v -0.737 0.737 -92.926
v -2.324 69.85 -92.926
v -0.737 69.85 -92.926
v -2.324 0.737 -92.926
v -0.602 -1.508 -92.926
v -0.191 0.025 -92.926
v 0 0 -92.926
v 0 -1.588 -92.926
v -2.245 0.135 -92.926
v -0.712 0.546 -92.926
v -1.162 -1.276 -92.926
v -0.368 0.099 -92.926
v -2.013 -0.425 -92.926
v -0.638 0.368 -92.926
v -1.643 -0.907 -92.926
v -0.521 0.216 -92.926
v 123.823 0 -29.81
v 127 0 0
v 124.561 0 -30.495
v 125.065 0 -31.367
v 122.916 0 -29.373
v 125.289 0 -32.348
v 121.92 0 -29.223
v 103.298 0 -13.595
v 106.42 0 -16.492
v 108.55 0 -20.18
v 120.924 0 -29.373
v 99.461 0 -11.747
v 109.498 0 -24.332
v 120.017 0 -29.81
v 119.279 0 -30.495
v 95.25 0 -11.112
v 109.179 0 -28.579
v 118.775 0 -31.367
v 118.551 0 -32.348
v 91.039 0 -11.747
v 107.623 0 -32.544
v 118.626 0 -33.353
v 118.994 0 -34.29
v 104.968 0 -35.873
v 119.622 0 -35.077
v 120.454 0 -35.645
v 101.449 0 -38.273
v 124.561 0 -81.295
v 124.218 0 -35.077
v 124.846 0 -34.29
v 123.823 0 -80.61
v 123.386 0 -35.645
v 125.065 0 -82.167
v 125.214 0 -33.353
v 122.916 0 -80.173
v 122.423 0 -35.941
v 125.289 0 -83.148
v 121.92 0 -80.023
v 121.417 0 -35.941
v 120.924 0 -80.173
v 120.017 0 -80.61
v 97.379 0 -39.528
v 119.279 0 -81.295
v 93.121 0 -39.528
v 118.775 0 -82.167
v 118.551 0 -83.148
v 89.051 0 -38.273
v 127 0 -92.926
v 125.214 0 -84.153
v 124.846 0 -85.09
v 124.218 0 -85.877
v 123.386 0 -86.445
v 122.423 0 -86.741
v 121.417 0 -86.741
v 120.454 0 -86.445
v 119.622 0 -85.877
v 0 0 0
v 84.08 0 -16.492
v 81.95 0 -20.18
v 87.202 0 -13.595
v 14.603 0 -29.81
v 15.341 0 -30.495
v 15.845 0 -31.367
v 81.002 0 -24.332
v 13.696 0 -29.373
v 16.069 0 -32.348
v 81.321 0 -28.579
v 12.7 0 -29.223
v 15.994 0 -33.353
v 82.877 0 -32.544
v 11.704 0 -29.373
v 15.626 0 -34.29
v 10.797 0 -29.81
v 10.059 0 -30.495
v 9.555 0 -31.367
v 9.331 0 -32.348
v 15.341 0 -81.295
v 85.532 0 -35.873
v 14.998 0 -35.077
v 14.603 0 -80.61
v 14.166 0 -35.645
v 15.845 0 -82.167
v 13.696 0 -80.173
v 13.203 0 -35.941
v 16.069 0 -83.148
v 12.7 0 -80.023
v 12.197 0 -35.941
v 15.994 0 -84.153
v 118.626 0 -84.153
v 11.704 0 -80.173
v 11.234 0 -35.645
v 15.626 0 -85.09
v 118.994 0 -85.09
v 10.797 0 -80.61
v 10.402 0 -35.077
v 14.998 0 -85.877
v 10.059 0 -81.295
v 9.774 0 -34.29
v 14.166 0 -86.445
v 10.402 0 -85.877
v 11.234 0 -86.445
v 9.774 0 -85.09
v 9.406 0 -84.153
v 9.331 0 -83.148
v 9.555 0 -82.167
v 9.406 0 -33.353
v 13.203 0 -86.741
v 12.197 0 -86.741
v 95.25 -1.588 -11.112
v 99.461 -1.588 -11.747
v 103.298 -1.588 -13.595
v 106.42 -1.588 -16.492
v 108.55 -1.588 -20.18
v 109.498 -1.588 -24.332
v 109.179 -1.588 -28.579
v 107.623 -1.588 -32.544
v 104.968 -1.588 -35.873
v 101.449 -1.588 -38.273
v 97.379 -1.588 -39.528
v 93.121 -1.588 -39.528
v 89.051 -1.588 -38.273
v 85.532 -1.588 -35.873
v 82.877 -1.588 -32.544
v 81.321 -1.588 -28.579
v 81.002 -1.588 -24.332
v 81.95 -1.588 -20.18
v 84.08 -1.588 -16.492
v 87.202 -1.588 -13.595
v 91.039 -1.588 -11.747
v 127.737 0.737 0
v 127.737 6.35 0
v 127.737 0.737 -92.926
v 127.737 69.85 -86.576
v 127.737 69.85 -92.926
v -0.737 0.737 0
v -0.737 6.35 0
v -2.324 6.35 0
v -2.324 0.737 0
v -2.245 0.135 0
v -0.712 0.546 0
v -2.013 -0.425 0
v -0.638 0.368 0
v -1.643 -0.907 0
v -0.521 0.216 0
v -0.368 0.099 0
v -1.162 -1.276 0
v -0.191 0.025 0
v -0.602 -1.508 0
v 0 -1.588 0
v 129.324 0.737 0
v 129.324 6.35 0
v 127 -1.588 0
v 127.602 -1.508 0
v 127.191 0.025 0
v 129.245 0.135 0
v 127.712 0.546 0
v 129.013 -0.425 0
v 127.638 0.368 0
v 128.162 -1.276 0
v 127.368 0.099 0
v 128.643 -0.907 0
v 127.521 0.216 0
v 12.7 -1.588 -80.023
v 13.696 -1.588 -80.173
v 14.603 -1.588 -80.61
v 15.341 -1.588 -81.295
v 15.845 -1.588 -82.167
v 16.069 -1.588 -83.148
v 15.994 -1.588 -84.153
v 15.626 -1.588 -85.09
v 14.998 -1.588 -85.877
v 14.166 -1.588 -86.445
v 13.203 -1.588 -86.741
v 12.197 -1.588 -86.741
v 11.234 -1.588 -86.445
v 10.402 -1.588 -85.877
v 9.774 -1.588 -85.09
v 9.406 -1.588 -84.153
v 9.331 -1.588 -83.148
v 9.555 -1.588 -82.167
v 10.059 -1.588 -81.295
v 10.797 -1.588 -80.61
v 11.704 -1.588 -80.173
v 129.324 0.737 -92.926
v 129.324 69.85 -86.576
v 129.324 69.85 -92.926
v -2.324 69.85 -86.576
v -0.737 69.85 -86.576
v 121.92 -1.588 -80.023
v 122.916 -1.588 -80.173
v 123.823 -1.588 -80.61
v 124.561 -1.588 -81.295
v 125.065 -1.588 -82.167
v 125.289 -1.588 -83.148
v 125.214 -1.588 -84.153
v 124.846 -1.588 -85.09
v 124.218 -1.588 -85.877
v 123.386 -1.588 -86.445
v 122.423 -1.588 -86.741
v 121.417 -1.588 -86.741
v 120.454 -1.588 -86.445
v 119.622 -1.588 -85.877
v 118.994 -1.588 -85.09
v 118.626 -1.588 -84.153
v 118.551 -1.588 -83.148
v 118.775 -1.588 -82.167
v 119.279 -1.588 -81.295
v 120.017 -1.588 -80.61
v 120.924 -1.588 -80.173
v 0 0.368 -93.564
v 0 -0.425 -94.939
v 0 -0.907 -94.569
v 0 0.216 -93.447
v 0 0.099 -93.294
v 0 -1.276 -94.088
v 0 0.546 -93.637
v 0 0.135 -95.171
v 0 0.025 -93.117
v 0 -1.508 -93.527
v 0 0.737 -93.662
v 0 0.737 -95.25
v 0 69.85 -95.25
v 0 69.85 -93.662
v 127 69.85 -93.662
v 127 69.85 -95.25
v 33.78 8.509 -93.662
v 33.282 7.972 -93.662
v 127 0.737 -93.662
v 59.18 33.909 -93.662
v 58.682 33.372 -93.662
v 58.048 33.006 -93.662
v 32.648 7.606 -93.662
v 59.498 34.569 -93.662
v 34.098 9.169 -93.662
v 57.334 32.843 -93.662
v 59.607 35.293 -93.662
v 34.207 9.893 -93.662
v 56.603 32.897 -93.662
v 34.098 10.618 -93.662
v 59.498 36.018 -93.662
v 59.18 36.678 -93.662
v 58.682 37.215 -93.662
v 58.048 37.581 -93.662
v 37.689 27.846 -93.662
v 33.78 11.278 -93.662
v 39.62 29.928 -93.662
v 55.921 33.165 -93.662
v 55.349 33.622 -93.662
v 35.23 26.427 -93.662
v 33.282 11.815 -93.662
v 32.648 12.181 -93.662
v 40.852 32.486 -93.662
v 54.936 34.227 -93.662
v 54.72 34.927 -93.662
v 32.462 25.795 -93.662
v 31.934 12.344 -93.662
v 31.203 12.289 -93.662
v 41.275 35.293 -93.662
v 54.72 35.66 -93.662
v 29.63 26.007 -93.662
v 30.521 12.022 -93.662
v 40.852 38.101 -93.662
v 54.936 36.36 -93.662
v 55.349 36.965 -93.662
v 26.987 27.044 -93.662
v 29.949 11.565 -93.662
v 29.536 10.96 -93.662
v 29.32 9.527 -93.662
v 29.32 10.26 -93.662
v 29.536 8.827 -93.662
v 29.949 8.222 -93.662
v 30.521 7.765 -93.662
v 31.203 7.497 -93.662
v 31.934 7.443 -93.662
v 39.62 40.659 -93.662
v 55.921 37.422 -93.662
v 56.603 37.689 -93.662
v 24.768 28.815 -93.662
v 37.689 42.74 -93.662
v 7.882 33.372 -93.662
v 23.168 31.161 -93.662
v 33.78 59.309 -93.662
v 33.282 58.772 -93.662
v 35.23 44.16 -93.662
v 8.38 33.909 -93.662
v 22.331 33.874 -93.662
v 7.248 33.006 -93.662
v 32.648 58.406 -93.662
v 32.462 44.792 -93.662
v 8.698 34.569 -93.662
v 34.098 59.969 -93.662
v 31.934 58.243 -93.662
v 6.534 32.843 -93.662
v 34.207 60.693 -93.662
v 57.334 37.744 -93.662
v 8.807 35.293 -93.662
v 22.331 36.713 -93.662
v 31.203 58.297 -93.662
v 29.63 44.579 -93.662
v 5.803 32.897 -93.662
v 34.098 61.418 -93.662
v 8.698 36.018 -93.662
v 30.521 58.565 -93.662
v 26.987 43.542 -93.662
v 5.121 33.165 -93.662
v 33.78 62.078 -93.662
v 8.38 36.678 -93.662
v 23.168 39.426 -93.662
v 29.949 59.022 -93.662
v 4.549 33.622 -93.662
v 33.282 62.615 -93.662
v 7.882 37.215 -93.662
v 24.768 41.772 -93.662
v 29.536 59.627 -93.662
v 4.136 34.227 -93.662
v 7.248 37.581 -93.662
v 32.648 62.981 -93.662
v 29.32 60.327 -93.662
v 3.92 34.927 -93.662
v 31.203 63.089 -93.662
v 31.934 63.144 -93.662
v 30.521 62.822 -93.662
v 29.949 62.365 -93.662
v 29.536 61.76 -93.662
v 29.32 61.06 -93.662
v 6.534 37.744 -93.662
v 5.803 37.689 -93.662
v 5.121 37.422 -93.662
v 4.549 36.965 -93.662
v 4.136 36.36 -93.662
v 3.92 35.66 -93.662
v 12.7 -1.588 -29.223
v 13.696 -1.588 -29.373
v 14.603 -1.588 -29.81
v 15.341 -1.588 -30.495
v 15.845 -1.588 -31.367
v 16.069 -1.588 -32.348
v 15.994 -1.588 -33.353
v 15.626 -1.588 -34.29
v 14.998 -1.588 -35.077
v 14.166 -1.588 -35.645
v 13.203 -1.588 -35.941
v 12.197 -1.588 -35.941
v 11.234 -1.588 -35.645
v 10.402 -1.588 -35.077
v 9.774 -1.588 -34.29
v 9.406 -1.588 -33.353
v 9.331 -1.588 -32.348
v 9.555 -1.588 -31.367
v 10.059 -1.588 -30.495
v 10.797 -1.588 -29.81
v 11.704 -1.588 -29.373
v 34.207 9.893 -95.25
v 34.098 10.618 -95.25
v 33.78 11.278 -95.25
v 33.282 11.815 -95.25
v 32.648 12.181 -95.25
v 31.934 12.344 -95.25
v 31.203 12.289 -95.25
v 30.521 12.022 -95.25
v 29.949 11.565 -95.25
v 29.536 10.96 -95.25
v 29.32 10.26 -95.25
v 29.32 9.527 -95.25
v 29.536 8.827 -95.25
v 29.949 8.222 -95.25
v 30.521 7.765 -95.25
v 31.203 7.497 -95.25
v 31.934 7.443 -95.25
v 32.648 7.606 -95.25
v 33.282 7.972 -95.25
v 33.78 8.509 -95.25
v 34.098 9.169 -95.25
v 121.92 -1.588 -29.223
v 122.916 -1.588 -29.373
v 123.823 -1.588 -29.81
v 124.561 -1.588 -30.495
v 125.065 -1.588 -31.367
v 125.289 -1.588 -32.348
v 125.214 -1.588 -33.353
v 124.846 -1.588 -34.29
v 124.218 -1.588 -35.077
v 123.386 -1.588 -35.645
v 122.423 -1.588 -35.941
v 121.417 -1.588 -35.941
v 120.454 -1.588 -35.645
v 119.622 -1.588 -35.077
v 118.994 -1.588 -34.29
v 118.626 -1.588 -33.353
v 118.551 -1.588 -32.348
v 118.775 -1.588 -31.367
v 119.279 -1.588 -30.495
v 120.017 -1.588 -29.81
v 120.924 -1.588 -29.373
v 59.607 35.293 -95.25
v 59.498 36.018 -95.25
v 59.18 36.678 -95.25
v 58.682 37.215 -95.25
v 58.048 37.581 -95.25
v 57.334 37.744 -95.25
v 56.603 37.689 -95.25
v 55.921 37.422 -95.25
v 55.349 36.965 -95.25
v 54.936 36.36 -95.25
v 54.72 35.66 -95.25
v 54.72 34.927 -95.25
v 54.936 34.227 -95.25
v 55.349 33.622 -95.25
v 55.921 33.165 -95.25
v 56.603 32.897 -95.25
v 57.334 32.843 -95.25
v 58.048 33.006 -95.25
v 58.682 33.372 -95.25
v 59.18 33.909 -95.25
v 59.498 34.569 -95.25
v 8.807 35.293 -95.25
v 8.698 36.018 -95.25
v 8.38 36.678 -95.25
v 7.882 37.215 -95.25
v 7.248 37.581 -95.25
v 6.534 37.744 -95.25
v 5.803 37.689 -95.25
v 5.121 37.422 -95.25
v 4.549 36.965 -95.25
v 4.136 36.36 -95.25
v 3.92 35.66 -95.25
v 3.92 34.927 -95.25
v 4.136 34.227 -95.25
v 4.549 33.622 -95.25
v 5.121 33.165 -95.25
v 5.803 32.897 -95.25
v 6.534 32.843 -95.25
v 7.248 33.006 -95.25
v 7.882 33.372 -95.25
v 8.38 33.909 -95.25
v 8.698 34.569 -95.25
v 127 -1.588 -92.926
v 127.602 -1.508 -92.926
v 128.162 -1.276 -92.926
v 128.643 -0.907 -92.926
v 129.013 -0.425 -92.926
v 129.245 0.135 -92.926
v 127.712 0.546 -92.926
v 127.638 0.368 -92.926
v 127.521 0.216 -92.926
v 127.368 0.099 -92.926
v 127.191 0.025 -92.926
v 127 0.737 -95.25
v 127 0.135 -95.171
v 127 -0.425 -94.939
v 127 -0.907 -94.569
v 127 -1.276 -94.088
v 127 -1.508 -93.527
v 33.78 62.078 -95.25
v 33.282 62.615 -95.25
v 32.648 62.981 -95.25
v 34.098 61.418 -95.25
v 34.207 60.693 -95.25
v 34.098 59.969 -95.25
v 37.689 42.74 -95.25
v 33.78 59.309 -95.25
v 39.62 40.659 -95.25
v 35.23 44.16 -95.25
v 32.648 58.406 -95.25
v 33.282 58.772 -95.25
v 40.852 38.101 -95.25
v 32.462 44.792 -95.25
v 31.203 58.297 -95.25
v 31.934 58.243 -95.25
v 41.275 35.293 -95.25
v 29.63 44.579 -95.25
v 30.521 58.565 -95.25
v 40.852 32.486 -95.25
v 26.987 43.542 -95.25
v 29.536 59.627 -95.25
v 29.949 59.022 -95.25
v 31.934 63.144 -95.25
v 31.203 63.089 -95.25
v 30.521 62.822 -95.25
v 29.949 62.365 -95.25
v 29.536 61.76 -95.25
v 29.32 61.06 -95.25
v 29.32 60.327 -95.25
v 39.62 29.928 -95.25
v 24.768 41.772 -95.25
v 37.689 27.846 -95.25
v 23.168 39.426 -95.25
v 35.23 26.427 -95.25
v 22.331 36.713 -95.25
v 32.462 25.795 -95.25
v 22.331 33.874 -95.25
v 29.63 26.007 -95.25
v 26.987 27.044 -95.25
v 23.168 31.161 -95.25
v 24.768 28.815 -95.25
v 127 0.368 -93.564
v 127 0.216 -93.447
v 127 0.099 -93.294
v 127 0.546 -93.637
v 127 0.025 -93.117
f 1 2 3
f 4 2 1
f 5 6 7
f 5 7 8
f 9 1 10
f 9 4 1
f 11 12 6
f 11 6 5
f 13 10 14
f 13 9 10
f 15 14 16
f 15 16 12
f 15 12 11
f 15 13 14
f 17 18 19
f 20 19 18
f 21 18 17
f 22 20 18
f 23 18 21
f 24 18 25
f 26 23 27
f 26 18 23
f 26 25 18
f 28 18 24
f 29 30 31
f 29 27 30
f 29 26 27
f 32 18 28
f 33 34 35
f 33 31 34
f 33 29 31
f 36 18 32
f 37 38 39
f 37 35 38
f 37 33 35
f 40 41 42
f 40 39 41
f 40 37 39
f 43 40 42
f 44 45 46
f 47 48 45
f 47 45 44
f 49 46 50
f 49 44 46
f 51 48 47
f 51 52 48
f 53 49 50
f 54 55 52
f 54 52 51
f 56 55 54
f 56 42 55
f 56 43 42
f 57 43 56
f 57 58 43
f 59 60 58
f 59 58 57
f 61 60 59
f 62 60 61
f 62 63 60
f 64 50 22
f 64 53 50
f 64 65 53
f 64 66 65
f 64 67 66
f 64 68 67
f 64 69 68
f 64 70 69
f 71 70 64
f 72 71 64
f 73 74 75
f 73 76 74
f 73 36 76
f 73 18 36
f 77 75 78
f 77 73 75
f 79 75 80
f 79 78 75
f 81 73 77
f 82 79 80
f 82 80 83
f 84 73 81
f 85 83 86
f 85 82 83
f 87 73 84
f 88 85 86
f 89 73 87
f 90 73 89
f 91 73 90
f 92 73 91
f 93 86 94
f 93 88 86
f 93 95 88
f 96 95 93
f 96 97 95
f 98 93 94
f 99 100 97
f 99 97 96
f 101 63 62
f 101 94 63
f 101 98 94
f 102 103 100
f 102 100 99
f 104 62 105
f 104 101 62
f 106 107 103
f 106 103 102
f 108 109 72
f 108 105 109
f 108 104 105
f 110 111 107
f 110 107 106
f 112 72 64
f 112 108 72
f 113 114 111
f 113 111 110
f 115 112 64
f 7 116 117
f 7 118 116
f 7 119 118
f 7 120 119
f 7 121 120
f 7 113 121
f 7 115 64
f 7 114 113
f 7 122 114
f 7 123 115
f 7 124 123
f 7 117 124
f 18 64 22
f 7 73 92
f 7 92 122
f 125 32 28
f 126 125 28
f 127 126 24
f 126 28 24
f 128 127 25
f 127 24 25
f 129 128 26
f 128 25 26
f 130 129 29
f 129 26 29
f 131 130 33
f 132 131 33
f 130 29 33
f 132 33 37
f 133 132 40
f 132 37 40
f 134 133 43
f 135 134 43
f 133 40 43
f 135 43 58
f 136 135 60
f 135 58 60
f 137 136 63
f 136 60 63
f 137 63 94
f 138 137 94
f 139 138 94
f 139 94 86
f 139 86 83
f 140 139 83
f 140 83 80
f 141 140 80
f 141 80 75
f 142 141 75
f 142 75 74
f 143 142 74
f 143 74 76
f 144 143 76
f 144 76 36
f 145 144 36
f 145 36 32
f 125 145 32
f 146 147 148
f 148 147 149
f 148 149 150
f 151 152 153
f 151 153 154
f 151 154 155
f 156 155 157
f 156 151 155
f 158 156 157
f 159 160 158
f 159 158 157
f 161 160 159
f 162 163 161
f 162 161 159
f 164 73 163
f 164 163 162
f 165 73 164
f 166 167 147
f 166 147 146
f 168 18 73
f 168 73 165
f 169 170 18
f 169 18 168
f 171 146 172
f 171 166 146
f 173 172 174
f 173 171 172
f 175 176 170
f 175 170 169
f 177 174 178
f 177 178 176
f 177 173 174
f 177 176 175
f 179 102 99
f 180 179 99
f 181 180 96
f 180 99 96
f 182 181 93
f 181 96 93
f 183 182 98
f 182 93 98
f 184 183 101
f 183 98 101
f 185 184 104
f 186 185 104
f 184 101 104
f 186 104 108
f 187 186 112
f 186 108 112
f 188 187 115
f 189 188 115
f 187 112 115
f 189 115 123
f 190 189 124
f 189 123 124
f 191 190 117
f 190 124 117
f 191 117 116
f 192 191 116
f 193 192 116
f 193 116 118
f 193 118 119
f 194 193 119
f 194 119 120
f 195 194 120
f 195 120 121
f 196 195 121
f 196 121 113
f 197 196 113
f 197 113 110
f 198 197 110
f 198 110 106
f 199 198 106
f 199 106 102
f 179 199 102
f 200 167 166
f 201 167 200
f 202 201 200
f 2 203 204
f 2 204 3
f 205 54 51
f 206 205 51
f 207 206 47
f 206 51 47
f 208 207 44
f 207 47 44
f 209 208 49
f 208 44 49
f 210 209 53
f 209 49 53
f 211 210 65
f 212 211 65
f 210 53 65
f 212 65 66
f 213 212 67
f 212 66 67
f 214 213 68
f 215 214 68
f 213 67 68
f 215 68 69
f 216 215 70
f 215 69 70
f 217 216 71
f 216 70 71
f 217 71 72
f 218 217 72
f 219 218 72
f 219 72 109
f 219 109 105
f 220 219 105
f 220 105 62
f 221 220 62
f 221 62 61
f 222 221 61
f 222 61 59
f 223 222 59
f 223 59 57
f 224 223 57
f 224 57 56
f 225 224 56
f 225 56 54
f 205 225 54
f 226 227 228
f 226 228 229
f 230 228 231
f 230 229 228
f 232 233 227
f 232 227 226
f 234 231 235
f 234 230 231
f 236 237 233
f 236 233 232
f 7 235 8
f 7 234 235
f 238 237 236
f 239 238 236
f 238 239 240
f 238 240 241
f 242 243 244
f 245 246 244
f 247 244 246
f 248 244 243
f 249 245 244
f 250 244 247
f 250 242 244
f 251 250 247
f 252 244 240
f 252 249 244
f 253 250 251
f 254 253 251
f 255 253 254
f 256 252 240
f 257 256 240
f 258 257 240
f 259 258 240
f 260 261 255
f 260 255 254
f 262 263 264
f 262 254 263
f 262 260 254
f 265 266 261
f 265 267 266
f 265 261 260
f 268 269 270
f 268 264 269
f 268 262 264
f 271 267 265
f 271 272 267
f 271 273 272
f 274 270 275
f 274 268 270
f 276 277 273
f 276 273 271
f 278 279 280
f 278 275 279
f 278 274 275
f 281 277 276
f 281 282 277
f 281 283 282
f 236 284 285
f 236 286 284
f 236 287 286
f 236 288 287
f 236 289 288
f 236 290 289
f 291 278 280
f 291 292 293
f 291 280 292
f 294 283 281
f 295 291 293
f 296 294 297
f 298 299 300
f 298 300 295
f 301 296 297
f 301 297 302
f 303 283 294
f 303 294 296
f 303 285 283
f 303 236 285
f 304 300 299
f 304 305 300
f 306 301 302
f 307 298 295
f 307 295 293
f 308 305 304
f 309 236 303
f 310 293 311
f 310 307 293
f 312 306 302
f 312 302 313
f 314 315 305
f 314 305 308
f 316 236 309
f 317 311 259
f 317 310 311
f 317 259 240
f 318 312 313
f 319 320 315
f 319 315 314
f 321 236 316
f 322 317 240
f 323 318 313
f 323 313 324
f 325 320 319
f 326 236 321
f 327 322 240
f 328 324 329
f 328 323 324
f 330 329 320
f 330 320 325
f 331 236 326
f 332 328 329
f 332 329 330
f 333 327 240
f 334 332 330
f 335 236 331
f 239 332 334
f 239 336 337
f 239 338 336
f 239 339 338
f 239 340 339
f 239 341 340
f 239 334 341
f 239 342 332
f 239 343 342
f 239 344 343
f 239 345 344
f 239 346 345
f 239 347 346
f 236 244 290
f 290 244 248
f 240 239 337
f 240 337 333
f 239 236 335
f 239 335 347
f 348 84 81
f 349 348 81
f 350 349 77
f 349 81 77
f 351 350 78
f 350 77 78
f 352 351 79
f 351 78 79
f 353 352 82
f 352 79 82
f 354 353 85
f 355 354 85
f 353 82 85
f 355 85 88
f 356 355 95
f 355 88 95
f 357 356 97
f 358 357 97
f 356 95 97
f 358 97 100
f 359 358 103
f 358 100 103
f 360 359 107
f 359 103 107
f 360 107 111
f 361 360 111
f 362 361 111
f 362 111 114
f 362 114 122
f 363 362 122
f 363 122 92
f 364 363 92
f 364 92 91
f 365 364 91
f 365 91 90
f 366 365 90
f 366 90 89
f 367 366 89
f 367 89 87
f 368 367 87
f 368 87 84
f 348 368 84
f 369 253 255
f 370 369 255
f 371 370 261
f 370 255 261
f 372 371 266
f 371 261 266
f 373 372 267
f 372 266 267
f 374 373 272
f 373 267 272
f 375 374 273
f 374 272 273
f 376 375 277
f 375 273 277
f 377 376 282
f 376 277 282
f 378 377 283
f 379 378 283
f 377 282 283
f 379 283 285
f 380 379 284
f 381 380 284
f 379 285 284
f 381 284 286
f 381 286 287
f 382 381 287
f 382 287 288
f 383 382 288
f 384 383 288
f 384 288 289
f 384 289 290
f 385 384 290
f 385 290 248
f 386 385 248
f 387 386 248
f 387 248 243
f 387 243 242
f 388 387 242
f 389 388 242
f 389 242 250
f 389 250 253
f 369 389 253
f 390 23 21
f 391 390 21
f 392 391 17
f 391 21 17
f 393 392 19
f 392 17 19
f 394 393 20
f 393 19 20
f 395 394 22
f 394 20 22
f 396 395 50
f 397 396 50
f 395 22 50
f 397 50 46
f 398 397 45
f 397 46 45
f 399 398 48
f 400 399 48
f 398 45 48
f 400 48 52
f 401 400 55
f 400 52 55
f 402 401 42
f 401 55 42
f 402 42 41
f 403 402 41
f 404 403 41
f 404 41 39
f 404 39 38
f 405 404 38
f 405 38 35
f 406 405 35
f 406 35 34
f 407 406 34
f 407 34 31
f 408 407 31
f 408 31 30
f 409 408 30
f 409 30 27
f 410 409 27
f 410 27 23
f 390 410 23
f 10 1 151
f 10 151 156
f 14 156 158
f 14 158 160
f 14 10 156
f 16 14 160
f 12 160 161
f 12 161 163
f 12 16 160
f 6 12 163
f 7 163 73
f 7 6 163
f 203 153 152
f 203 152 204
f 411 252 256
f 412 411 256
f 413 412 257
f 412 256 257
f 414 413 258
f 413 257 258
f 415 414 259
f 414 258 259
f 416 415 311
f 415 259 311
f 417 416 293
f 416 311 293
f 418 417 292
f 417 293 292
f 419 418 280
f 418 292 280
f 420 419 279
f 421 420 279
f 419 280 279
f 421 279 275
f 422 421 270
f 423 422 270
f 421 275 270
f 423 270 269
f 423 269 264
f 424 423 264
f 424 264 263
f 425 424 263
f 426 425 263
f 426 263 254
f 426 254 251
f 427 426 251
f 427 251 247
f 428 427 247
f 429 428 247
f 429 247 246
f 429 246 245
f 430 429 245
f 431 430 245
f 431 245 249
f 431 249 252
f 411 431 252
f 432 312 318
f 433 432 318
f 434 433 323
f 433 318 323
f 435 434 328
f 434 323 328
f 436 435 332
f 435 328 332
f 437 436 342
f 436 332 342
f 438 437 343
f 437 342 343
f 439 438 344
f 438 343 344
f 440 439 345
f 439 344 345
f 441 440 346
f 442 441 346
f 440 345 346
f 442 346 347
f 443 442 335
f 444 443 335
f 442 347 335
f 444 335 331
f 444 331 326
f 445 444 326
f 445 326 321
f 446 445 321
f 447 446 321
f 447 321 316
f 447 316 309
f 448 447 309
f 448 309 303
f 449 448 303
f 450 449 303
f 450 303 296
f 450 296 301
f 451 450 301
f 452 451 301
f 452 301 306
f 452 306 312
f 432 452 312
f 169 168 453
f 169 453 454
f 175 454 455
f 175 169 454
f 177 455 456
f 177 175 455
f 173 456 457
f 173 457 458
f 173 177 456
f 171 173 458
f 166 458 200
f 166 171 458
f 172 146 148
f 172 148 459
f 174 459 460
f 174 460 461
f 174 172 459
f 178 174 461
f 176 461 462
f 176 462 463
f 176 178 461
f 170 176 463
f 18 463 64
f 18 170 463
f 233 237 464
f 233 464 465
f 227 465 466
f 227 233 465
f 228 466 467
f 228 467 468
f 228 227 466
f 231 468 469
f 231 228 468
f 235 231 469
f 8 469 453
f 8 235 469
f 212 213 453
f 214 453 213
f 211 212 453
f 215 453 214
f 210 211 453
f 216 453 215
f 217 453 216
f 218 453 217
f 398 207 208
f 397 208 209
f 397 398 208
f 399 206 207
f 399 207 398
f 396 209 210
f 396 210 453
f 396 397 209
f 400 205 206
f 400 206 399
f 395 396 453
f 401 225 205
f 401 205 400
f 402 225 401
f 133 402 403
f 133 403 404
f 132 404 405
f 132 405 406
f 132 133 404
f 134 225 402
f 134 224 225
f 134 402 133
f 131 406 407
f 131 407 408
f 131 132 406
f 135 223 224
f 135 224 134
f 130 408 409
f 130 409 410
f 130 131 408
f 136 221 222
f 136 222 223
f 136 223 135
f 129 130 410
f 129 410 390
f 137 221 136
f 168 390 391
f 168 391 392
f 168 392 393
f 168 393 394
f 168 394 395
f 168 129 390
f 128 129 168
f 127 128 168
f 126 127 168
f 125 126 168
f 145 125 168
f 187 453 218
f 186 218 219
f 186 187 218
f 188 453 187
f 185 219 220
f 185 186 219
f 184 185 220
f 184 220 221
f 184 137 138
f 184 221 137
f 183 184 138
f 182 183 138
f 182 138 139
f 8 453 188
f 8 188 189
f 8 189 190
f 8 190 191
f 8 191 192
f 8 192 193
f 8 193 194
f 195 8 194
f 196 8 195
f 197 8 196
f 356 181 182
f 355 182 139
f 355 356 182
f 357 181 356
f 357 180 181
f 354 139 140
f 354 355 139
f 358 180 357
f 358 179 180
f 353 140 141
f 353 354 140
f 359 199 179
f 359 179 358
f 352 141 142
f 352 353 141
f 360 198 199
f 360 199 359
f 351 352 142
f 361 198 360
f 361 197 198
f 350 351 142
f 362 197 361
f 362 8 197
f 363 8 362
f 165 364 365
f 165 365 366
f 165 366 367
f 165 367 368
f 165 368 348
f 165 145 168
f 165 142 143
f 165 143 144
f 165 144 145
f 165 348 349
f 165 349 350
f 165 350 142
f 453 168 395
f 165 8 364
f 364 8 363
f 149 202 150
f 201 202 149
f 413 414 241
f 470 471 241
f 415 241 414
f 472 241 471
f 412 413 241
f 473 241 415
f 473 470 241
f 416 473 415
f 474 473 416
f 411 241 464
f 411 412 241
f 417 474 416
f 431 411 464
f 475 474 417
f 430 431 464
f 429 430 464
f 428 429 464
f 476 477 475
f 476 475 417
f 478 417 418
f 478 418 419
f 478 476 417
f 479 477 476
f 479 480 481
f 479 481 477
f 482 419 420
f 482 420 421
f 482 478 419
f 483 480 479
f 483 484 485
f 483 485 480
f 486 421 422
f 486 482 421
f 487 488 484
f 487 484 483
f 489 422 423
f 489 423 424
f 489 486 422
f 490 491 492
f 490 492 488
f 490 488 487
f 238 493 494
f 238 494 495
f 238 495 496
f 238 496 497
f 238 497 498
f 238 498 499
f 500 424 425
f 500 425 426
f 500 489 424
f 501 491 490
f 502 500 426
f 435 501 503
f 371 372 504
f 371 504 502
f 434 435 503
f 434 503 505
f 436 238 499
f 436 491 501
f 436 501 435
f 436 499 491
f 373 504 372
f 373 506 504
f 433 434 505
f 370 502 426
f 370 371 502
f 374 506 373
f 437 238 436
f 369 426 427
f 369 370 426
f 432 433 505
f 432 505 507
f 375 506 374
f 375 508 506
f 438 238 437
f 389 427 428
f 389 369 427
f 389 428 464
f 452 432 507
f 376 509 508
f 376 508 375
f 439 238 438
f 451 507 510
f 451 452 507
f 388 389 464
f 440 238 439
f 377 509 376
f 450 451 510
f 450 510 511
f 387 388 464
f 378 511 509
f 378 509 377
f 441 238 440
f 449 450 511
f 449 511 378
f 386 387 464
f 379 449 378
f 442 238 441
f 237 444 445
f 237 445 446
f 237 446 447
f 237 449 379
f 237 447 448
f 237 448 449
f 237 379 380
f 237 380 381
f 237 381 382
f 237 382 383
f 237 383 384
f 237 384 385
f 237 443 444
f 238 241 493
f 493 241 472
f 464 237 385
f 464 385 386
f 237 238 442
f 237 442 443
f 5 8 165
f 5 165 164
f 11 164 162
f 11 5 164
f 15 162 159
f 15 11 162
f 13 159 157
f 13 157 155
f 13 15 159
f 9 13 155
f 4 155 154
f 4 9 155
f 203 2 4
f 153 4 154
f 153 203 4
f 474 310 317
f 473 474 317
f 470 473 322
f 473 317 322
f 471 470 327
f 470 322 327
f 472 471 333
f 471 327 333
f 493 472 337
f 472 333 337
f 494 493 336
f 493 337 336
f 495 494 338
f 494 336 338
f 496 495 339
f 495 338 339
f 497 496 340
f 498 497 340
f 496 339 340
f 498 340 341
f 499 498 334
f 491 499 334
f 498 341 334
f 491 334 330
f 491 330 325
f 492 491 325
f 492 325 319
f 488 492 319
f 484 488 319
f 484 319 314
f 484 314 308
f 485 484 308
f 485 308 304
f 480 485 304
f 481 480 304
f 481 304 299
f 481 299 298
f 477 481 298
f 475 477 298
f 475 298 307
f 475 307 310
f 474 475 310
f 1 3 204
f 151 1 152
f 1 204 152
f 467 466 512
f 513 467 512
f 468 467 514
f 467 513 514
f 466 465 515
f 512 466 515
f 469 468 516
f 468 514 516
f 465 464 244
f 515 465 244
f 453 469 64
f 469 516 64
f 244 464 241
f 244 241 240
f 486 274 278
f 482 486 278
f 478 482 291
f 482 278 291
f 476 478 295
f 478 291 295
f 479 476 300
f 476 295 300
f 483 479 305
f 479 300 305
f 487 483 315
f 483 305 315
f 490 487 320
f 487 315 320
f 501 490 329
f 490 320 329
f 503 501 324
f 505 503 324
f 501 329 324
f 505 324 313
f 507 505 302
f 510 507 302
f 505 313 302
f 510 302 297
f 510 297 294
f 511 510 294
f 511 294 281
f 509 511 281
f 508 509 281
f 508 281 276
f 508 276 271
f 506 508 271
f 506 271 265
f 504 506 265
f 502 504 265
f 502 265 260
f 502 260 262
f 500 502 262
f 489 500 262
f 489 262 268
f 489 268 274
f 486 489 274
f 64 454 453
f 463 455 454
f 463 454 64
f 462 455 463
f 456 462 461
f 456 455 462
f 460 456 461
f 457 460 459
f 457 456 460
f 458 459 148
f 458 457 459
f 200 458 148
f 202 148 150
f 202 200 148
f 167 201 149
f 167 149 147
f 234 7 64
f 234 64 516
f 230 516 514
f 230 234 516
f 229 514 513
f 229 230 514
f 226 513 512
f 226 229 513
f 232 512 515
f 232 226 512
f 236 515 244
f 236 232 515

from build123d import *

# Parameters (mm, degrees)
BASE_FLANGE1_DEPTH           = 127
EDGE_FLANGE1_DEPTH           = 92.9259
EDGE_FLANGE1_START           = 1.5875
EDGE_FLANGE1_FLAT_DEPTH      = 1.5875
EDGE_FLANGE1_BEND_DEPTH      = 92.9259
EDGE_FLANGE1_FLAT_2_DEPTH    = 1.5875
SKETCH15_R                   = 14.2875
CUT_EXTRUDE1_DEPTH           = 176.146532483
SKETCH16_R                   = 3.3782
CUT_EXTRUDE2_DEPTH           = 176.146532483
SKETCH17_R                   = 9.525
CUT_EXTRUDE3_DEPTH           = 175.288293488
F_10_0_1935_DIAMETER_HOLE1_D = 4.9149


# Sheet-metal steps are written as plain solids
with BuildPart() as part:
    # Sketch1 → Base-Flange1 (new body)
    with BuildSketch(Plane(origin=(0, 0, 0), x_dir=(0, 0, -1), z_dir=(1, 0, 0))):
        with BuildLine():
            Line((0, 0), (92.9259, 0))
            ThreePointArc((92.9259, 0), (93.446754855, 0.215745145), (93.6625, 0.7366))
            Line((93.6625, 0.7366), (93.6625, 69.85))
            Line((93.6625, 69.85), (95.25, 69.85))
            Line((95.25, 69.85), (95.25, 0.7366))
            ThreePointArc((95.25, 0.7366), (94.56928687, -0.90678687), (92.9259, -1.5875))
            Line((92.9259, -1.5875), (0, -1.5875))
            Line((0, -1.5875), (0, 0))
        make_face()
    extrude(amount=BASE_FLANGE1_DEPTH)

    # Edge-Flange1 bend section (across the edge) → Edge-Flange1 (add)
    with BuildSketch(Plane(origin=(-0.7366, 0, -92.9259), x_dir=(1, 0, 0), z_dir=(0, 0, 1))):
        with BuildLine():
            Line((-1.5875, 0.7366), (0, 0.7366))
            ThreePointArc((0, 0.7366), (0.215745145, 0.215745145), (0.7366, 0))
            Line((0.7366, 0), (0.7366, -1.5875))
            ThreePointArc((0.7366, -1.5875), (-0.90678687, -0.90678687), (-1.5875, 0.7366))
        make_face()
    extrude(amount=EDGE_FLANGE1_DEPTH)

    # Edge-Flange1 profile (on flange) → Edge-Flange1 flat (add)
    with BuildSketch(Plane.ZY.offset(0.7366).offset(EDGE_FLANGE1_START)):
        Polygon((0, 0.7366), (0, 6.35), (-86.5759, 69.85), (-92.9259, 69.85), (-92.9259, 0.7366), align=None)
    extrude(amount=-EDGE_FLANGE1_FLAT_DEPTH)

    # Edge-Flange1 bend section 2 (across the edge) → Edge-Flange1 bend (add)
    with BuildSketch(Plane(origin=(127.7366, 0, 0), x_dir=(-1, 0, 0), z_dir=(0, 0, -1))):
        with BuildLine():
            Line((-1.5875, 0.7366), (0, 0.7366))
            ThreePointArc((0, 0.7366), (0.215745145, 0.215745145), (0.7366, 0))
            Line((0.7366, 0), (0.7366, -1.5875))
            ThreePointArc((0.7366, -1.5875), (-0.90678687, -0.90678687), (-1.5875, 0.7366))
        make_face()
    extrude(amount=EDGE_FLANGE1_BEND_DEPTH)

    # Edge-Flange1 profile 2 (on flange) → Edge-Flange1 flat 2 (add)
    with BuildSketch(Plane(origin=(127.7366, 0, 0), x_dir=(0, 0, -1), z_dir=(1, 0, 0)).offset(EDGE_FLANGE1_START)):
        Polygon((0, 6.35), (0, 0.7366), (92.9259, 0.7366), (92.9259, 69.85), (86.5759, 69.85), align=None)
    extrude(amount=-EDGE_FLANGE1_FLAT_2_DEPTH)

    # Sketch15 → Cut-Extrude1 (cut, through all)
    with BuildSketch(Plane(origin=(0, 0, 0), x_dir=(1, 0, 0), z_dir=(0, 1, 0))):
        with Locations(Location((95.25, 25.4, 0), (0, 0, 270))):
            Circle(SKETCH15_R)
    extrude(amount=-CUT_EXTRUDE1_DEPTH, mode=Mode.SUBTRACT)

    # Sketch16 → Cut-Extrude2 (cut, through all)
    with BuildSketch(Plane(origin=(0, 0, 0), x_dir=(1, 0, 0), z_dir=(0, 1, 0))):
        with Locations(Location((12.7, 83.4009, 0), (0, 0, 270))):
            Circle(SKETCH16_R)
        with Locations(Location((121.92, 83.4009, 0), (0, 0, 270))):
            Circle(SKETCH16_R)
        with Locations(Location((121.92, 32.6009, 0), (0, 0, 270))):
            Circle(SKETCH16_R)
        with Locations(Location((12.7, 32.6009, 0), (0, 0, 270))):
            Circle(SKETCH16_R)
    extrude(amount=-CUT_EXTRUDE2_DEPTH, mode=Mode.SUBTRACT)

    # Sketch17 → Cut-Extrude3 (cut, through all)
    with BuildSketch(Plane.XY.offset(-93.6625)):
        with Locations((31.75, 35.2933)):
            Circle(SKETCH17_R)
    extrude(amount=-CUT_EXTRUDE3_DEPTH, mode=Mode.SUBTRACT)

    # #10 (0.1935) Diameter Hole1 (through all)
    with Locations(Plane(origin=(0, 0, -95.25), x_dir=(-1, 0, 0), z_dir=(0, 0, -1))):
        with Locations((-31.75, 60.6933), (-6.35, 35.2933), (-31.75, 9.8933), (-57.15, 35.2933)):
            Hole(F_10_0_1935_DIAMETER_HOLE1_D / 2)


solid = part.part
